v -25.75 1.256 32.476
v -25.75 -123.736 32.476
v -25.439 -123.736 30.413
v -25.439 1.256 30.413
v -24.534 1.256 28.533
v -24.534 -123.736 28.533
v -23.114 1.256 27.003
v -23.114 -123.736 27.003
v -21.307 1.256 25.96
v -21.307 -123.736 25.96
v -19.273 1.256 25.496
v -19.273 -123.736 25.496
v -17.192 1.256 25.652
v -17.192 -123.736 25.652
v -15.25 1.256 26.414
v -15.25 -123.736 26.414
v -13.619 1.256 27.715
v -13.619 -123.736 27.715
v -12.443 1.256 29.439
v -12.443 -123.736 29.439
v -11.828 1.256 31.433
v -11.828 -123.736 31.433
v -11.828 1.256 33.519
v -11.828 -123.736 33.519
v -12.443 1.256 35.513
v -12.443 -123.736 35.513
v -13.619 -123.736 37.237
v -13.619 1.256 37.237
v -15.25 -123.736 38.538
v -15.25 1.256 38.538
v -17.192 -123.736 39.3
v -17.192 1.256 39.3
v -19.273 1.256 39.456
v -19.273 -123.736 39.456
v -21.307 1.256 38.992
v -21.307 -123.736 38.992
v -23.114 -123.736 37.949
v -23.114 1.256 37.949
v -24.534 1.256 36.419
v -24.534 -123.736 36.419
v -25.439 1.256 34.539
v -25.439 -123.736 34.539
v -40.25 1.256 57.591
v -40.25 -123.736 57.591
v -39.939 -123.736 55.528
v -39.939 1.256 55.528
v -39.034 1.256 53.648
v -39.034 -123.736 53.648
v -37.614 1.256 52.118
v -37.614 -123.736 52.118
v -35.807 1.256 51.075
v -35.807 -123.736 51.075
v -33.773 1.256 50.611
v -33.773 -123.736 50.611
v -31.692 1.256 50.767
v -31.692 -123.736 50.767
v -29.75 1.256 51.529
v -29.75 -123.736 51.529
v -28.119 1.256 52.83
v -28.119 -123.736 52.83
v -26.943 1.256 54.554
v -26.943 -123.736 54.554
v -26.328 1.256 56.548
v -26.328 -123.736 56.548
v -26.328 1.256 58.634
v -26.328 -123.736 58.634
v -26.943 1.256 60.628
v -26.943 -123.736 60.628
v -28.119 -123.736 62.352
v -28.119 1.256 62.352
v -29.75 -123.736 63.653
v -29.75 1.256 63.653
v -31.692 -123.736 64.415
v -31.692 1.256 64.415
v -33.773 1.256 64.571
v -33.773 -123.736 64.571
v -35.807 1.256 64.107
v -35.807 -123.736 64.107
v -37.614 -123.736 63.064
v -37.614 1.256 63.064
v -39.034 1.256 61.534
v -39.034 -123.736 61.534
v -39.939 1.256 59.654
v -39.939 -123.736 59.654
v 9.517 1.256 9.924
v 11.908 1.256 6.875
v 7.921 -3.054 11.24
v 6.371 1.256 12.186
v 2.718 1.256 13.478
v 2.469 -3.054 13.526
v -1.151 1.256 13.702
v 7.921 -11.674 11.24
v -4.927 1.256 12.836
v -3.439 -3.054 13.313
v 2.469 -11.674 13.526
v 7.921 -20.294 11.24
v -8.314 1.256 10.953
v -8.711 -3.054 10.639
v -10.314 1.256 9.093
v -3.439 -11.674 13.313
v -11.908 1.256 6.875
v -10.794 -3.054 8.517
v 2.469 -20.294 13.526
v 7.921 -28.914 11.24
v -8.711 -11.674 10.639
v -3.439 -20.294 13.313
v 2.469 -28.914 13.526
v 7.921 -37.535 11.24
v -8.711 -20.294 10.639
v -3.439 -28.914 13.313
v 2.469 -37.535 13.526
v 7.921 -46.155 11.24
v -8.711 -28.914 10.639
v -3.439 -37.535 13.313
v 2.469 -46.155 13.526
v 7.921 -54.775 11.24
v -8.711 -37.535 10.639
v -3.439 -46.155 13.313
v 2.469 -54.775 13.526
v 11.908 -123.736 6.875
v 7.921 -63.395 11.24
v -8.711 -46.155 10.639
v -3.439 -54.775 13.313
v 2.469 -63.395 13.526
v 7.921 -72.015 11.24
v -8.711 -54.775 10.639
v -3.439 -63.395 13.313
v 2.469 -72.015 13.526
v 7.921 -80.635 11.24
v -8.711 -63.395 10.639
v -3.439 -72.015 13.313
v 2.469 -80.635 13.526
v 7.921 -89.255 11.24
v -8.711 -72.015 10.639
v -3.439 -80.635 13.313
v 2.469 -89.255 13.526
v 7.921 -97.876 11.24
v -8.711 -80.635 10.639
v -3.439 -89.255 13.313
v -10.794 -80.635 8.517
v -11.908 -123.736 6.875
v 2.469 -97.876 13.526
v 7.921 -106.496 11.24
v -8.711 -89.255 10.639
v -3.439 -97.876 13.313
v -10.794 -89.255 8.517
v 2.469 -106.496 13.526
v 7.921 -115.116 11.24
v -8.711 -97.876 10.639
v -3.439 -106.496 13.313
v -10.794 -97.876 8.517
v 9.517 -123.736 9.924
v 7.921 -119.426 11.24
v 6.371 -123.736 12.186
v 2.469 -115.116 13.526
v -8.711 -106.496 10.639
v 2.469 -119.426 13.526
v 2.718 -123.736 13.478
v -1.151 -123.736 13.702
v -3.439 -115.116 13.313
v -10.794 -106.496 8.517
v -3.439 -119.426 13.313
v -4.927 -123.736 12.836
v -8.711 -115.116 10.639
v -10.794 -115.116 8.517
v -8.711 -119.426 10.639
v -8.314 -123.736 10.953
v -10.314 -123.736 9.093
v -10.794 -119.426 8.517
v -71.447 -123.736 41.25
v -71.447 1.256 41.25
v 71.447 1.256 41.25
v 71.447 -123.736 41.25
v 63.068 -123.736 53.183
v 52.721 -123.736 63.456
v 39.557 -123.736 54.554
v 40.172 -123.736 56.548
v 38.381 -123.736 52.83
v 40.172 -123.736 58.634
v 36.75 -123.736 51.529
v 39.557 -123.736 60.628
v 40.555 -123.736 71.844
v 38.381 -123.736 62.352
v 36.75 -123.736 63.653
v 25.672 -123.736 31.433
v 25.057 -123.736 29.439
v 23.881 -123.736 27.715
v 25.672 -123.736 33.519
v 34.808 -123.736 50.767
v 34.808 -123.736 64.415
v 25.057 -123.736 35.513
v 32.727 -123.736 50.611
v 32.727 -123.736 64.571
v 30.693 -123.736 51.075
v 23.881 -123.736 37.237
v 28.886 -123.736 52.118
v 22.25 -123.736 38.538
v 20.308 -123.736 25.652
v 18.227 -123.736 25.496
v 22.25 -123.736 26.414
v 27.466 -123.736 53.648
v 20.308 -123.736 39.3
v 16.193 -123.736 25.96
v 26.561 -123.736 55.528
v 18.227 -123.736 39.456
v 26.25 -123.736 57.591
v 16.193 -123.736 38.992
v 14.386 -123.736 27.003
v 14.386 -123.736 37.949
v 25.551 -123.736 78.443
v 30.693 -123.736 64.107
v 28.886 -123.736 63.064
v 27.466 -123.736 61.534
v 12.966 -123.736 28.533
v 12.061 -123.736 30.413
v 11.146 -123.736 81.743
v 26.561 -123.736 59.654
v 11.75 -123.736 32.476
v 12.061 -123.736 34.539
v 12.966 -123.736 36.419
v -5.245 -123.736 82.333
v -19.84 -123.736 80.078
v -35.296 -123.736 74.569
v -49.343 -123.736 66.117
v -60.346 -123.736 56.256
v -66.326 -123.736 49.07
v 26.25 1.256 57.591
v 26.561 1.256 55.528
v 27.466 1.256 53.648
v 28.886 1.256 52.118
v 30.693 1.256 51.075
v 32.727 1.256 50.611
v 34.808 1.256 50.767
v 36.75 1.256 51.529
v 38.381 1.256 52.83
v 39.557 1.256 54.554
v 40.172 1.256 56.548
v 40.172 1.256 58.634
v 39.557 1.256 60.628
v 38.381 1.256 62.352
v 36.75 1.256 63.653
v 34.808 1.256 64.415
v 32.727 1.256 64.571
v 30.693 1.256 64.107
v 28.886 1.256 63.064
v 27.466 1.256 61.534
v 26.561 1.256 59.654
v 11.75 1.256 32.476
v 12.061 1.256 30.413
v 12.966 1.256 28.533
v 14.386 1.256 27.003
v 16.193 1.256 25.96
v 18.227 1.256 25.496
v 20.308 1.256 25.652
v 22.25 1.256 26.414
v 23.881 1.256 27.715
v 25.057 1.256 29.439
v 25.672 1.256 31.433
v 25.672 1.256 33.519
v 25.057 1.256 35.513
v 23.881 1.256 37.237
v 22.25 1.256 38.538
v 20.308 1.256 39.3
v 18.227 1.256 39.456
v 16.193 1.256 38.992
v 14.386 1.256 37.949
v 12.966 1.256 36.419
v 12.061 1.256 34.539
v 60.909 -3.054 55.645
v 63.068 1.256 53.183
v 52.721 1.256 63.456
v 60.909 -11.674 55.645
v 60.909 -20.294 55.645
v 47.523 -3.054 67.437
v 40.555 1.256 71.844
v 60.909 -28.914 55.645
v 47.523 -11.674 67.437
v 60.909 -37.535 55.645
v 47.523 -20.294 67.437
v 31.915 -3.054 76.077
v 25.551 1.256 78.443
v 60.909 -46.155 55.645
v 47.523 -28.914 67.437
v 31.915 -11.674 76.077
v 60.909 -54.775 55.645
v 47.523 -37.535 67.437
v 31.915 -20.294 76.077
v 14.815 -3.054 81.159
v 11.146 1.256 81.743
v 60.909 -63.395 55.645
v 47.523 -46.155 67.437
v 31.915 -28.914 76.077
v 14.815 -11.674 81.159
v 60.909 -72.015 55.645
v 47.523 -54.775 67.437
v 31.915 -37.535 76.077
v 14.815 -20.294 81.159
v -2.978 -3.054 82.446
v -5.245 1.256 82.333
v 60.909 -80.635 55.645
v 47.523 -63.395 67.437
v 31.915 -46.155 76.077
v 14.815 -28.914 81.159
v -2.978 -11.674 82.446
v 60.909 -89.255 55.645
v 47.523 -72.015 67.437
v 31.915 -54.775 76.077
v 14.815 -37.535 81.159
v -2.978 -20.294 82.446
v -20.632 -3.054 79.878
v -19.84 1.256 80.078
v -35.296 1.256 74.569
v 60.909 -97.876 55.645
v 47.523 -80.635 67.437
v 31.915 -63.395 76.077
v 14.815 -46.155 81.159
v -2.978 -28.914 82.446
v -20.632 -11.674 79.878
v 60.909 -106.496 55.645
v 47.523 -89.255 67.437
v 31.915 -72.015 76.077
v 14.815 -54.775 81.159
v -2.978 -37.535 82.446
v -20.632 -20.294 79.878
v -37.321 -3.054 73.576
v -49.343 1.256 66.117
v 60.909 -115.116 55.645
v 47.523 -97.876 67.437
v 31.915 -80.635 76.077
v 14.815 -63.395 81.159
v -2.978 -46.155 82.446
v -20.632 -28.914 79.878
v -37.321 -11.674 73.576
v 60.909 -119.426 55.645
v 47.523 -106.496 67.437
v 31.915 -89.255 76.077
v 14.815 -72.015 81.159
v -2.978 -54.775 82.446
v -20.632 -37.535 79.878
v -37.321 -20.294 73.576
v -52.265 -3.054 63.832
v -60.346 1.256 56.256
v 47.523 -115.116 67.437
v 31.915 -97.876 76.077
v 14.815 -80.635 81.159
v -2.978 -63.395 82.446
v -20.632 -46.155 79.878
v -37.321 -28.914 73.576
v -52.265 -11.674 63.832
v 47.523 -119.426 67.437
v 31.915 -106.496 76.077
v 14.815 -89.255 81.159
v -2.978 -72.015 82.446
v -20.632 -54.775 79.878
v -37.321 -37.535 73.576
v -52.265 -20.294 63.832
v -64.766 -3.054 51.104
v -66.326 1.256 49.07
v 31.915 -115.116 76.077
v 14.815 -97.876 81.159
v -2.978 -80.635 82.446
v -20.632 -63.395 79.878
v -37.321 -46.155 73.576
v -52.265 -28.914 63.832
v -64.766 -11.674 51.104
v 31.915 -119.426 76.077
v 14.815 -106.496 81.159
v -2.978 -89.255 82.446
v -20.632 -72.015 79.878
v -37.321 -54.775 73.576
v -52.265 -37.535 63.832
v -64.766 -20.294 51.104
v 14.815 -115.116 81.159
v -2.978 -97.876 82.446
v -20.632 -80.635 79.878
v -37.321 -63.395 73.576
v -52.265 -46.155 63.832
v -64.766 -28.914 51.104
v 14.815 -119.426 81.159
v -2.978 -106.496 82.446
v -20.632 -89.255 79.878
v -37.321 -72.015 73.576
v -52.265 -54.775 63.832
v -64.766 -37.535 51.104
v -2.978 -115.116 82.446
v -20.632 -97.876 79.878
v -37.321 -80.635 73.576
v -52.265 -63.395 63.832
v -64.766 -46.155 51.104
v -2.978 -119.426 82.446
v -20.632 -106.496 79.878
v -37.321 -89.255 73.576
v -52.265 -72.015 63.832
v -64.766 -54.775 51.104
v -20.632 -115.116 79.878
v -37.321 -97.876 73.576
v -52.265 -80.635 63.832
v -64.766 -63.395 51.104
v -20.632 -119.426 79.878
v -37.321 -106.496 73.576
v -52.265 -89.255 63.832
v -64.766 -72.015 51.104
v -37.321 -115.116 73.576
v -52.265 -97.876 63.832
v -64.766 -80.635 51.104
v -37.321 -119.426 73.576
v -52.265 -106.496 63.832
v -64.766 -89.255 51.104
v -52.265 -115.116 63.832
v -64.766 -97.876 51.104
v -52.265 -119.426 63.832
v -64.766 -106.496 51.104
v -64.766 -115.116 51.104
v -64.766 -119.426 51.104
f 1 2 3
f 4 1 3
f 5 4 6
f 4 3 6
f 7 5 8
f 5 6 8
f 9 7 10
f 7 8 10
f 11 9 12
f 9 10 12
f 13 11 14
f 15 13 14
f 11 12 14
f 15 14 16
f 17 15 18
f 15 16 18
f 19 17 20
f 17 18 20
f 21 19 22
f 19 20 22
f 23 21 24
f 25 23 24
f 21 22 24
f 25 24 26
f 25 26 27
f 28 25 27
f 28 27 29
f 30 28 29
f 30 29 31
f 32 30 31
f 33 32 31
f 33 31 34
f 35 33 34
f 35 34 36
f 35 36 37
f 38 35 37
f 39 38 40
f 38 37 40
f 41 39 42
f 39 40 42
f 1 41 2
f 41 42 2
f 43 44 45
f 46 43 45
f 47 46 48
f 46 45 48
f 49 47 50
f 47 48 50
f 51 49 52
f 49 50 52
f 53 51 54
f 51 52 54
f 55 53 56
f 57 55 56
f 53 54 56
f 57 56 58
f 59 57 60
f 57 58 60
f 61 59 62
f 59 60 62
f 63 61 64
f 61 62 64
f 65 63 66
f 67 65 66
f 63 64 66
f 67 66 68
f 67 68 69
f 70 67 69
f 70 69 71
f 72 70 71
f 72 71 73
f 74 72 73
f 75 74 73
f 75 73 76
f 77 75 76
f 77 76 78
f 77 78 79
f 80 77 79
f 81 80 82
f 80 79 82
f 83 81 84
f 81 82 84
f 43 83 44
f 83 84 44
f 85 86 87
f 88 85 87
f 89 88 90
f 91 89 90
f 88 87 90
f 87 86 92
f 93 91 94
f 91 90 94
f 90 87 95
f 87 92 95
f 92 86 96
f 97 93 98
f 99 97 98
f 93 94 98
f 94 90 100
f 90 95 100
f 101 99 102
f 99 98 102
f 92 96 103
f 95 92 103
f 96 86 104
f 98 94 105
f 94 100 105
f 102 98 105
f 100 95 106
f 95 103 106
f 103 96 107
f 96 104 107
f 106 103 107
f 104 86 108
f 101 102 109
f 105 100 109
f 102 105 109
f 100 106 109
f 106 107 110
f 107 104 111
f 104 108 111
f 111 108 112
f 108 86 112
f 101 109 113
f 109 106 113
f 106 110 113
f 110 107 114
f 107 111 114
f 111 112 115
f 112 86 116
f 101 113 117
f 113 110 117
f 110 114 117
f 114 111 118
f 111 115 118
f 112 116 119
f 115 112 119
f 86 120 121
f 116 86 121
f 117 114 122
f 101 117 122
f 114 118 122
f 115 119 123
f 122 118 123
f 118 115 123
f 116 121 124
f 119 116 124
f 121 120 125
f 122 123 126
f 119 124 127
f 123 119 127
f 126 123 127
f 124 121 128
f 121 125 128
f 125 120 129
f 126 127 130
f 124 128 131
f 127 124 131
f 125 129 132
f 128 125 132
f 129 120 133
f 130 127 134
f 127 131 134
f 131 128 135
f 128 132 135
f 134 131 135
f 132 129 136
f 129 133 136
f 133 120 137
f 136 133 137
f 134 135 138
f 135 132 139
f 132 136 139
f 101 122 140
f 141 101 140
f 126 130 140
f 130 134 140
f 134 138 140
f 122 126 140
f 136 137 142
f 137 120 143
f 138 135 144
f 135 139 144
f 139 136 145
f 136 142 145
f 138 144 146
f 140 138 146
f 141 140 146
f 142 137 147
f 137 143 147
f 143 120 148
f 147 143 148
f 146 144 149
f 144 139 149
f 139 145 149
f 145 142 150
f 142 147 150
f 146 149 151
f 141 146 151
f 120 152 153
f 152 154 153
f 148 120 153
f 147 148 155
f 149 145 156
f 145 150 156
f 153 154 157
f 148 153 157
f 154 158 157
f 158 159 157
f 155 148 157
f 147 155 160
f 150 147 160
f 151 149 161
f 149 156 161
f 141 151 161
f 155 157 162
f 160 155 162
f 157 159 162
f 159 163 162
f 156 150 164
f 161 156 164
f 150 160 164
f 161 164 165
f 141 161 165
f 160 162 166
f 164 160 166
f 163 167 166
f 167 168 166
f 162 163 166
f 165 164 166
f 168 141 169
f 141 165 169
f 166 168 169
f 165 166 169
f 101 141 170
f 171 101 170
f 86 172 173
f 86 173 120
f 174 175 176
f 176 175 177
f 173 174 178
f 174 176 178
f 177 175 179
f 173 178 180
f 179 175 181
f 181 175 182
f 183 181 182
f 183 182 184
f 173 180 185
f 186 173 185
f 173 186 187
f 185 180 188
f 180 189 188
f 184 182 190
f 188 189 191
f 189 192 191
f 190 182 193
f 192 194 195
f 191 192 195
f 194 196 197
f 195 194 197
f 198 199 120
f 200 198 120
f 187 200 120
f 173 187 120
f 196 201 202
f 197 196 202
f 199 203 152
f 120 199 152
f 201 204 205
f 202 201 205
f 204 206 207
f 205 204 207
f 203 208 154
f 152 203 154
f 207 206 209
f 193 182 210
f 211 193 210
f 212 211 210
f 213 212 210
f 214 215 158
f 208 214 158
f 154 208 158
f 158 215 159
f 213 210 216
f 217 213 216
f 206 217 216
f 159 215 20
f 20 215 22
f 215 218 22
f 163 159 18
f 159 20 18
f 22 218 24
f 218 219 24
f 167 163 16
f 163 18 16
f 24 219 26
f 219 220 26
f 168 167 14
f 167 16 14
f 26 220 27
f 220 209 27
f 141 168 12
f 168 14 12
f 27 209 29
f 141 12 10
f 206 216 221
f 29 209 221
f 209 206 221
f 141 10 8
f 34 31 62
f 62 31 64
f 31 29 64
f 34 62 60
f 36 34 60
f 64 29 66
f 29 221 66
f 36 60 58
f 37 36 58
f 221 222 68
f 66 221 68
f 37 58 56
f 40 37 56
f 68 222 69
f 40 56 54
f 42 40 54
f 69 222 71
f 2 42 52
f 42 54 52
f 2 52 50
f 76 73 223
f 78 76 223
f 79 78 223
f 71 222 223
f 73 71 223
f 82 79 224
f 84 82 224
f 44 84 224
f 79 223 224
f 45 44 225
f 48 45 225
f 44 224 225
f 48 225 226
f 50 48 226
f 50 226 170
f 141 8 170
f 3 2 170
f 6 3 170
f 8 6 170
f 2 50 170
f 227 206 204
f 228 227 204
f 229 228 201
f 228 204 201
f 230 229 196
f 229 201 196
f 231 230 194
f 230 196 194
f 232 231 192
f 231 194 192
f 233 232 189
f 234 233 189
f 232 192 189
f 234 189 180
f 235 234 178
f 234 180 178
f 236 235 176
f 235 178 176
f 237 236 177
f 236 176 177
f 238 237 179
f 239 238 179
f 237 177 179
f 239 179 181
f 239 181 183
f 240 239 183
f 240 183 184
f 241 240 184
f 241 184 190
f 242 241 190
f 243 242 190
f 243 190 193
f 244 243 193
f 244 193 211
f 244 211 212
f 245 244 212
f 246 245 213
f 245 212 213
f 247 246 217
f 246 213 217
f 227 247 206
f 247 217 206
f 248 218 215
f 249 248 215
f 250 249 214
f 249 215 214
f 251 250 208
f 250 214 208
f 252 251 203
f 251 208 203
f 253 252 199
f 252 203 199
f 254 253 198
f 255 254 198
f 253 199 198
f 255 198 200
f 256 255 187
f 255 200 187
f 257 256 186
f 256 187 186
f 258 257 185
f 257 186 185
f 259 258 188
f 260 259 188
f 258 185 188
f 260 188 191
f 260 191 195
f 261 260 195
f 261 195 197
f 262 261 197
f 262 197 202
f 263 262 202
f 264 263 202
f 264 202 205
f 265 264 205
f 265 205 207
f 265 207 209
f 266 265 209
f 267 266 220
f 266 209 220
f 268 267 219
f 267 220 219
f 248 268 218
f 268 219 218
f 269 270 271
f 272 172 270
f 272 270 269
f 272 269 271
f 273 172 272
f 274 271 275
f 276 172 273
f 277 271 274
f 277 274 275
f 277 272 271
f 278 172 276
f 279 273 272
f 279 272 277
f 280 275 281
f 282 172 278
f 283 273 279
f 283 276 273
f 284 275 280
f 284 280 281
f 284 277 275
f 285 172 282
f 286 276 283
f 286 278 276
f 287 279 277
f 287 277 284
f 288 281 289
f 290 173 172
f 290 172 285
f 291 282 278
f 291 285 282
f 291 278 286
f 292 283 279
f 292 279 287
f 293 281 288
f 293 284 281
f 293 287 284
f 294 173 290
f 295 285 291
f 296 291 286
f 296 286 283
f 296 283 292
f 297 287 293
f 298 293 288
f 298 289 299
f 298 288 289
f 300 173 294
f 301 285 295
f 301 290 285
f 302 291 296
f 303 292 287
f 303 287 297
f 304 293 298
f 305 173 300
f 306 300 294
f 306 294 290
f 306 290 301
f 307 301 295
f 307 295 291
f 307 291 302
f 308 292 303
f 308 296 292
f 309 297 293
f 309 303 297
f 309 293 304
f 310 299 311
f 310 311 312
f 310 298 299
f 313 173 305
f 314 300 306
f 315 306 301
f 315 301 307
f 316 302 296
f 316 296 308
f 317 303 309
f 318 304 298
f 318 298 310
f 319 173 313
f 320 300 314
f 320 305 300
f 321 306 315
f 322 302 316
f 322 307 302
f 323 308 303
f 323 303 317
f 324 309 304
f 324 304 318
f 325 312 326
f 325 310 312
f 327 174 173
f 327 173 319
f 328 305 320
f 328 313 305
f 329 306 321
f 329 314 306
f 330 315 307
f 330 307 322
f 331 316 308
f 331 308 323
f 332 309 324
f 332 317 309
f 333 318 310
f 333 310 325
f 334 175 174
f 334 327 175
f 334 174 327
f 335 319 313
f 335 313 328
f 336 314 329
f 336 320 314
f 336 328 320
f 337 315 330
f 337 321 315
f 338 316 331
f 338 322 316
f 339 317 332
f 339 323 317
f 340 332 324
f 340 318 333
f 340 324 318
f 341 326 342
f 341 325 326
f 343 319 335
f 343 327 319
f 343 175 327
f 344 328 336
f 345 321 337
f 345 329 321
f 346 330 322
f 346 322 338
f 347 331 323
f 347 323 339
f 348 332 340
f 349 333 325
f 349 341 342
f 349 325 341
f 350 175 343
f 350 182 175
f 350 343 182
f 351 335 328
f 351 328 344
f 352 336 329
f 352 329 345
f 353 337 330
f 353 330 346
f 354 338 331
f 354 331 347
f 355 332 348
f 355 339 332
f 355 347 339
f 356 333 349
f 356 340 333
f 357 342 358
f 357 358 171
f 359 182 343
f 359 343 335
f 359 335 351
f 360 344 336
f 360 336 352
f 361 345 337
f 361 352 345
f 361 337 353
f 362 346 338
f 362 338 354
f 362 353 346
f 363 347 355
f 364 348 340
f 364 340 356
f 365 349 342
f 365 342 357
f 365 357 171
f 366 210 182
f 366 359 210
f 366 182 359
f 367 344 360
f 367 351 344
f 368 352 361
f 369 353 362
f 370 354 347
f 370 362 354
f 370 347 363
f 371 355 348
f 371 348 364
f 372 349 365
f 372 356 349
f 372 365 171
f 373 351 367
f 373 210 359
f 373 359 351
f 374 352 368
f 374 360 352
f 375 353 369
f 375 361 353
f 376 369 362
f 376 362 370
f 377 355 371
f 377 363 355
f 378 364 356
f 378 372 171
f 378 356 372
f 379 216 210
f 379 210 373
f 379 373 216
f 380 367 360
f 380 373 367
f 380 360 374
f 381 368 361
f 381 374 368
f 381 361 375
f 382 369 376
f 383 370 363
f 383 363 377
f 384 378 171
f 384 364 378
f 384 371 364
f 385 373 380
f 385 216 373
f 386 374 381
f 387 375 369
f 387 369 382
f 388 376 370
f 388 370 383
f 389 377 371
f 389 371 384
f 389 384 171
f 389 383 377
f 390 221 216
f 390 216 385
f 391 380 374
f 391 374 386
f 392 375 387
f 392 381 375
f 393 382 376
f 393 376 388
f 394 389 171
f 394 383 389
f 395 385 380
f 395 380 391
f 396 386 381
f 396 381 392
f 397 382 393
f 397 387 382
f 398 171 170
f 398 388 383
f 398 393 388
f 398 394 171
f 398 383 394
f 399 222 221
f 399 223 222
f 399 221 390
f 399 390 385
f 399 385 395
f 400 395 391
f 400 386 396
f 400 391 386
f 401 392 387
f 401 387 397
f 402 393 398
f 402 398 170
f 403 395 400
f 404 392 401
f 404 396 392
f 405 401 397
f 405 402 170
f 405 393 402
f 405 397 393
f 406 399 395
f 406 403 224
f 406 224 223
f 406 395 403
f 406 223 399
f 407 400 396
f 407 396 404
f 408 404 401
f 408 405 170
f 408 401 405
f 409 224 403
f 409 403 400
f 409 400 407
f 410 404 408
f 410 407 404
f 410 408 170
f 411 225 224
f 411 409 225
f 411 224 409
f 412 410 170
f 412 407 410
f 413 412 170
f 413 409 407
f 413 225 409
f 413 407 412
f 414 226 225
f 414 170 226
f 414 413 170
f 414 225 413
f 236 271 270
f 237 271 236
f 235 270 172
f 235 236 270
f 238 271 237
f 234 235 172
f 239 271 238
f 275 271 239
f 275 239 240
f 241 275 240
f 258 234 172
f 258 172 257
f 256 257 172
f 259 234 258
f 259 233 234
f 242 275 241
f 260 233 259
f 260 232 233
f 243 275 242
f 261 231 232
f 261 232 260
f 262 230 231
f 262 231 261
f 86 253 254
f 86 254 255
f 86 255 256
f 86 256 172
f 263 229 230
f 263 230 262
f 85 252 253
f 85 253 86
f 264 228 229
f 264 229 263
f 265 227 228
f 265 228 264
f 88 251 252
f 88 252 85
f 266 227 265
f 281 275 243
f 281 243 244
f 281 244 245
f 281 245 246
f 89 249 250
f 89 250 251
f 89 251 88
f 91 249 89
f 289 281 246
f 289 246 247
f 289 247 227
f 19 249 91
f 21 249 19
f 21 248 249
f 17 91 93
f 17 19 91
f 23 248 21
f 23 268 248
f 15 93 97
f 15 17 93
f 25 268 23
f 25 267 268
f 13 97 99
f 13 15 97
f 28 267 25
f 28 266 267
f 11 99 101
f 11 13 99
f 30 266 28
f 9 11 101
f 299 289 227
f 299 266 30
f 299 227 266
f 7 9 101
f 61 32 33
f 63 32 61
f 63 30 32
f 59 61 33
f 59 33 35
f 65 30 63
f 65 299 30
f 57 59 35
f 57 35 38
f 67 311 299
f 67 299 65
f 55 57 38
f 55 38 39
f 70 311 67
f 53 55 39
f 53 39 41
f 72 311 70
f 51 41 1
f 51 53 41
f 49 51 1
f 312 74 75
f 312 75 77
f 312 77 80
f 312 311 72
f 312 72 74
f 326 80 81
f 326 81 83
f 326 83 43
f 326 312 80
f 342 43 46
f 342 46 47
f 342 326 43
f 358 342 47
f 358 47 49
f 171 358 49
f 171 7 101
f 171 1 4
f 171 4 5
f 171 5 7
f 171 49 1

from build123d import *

# Parameters (mm, degrees)
F_3DSKETCH2_R  = 6.999845998
EXTRUDE3_DEPTH = 124.992


with BuildPart() as part:
    # 3DSketch2 → Extrude3 (new body)
    with BuildSketch(Plane(origin=(-18.75, -123.736, 32.476), x_dir=(0.8870183146835777, -1.4196355069849515e-13, 0.4617342411126832), z_dir=(0, -1, 0))):
        with BuildLine():
            Line((84.057647161, -33.864344653), (15.373349185, -36.864404238))
            add(Edge.make_bspline(
                [(15.373349185, -36.864404238), (15.352068384, -36.534110534), (15.309494256, -35.873328697), (15.15380243, -34.89161264), (14.935730394, -33.922345945), (14.643794083, -32.972322164), (14.286702831, -32.044997482), (13.863035519, -31.145928893), (13.374501259, -30.280509448), (12.825956594, -29.451879273), (12.217498956, -28.666136437), (11.555519853, -27.925462519), (10.84179713, -27.234048158), (10.079158018, -26.597430452), (9.273057277, -26.016087573), (8.427361578, -25.494638196), (7.545715962, -25.035700694), (6.633485756, -24.64206797), (5.694906567, -24.315223891), (4.735979636, -24.055686494), (3.760225519, -23.867649672), (2.773801545, -23.750253207), (1.781160185, -23.702549632), (0.787754631, -23.728523084), (-0.2013641, -23.8247555), (-1.180838094, -23.993423853), (-2.145269372, -24.232834664), (-3.090921175, -24.538636337), (-4.009966724, -24.915980503), (-4.903428486, -25.351563375), (-5.469117643, -25.695715914), (-5.751878998, -25.867741552)],
                knots=[0, 0, 0, 0, 0.034470888, 0.068962068, 0.103436508, 0.137919118, 0.17241911, 0.20689509, 0.241383087, 0.275880421, 0.310348632, 0.344841071, 0.379302859, 0.41379577, 0.448262511, 0.482772834, 0.517227166, 0.551737489, 0.58620423, 0.620697141, 0.655158929, 0.689651368, 0.724119579, 0.758616913, 0.79310491, 0.82758089, 0.862080882, 0.896563492, 0.931037932, 0.965529112, 1, 1, 1, 1], degree=3))
            Line((-5.751878998, -25.867741552), (-42.691947897, 32.114707997))
            add(Edge.make_bspline(
                [(84.057647161, -33.864344653), (83.929496966, -31.881927263), (83.673219895, -27.917453198), (82.746706821, -22.024979481), (81.427672342, -16.211783357), (79.684589433, -10.509460987), (77.535515525, -4.948506144), (74.991650083, 0.443580722), (72.065661239, 5.63846846), (68.77170116, 10.608095708), (65.128087834, 15.327241456), (61.152593676, 19.770248775), (56.867676078, 23.91550345), (52.295461541, 27.741669794), (47.45762087, 31.226291453), (42.381892258, 34.353953282), (37.093279559, 37.106921885), (31.61985405, 39.47058486), (25.990484034, 41.43463264), (20.233707282, 42.985186118), (14.380348982, 44.117375042), (8.460577738, 44.825313071), (2.504980102, 45.10300258), (-3.455233166, 44.950602481), (-9.38889544, 44.367574744), (-15.264902994, 43.358422936), (-21.052782359, 41.929020999), (-26.723582946, 40.085969417), (-32.241968491, 37.831968062), (-37.600141517, 35.210965428), (-40.994576154, 33.14685641), (-42.691947897, 32.114707997)],
                knots=[0, 0, 0, 0, 0.034483919, 0.068961564, 0.103450466, 0.137933366, 0.172414368, 0.206896206, 0.241380972, 0.27586552, 0.310346021, 0.3448291, 0.379311579, 0.413791406, 0.448274645, 0.482761184, 0.517238816, 0.551725355, 0.586208594, 0.620688421, 0.6551709, 0.689653979, 0.72413448, 0.758619028, 0.793103794, 0.827585632, 0.862066634, 0.896549534, 0.931038436, 0.965516081, 1, 1, 1, 1], degree=3))
        make_face()
        with Locations(Location((0, 0, 0), (0, 0, 152.500928353))):
            Circle(F_3DSKETCH2_R, mode=Mode.SUBTRACT)
        with Locations(Location((-1.265310097, 28.972611469, 0), (0, 0, 152.500928353))):
            Circle(F_3DSKETCH2_R, mode=Mode.SUBTRACT)
        with Locations(Location((33.263186801, -17.315034042, 0), (0, 0, 152.500928353))):
            Circle(F_3DSKETCH2_R, mode=Mode.SUBTRACT)
        with Locations(Location((57.721407829, -1.732715565, 0), (0, 0, 152.500928353))):
            Circle(F_3DSKETCH2_R, mode=Mode.SUBTRACT)
    extrude(amount=-EXTRUDE3_DEPTH)


solid = part.part
